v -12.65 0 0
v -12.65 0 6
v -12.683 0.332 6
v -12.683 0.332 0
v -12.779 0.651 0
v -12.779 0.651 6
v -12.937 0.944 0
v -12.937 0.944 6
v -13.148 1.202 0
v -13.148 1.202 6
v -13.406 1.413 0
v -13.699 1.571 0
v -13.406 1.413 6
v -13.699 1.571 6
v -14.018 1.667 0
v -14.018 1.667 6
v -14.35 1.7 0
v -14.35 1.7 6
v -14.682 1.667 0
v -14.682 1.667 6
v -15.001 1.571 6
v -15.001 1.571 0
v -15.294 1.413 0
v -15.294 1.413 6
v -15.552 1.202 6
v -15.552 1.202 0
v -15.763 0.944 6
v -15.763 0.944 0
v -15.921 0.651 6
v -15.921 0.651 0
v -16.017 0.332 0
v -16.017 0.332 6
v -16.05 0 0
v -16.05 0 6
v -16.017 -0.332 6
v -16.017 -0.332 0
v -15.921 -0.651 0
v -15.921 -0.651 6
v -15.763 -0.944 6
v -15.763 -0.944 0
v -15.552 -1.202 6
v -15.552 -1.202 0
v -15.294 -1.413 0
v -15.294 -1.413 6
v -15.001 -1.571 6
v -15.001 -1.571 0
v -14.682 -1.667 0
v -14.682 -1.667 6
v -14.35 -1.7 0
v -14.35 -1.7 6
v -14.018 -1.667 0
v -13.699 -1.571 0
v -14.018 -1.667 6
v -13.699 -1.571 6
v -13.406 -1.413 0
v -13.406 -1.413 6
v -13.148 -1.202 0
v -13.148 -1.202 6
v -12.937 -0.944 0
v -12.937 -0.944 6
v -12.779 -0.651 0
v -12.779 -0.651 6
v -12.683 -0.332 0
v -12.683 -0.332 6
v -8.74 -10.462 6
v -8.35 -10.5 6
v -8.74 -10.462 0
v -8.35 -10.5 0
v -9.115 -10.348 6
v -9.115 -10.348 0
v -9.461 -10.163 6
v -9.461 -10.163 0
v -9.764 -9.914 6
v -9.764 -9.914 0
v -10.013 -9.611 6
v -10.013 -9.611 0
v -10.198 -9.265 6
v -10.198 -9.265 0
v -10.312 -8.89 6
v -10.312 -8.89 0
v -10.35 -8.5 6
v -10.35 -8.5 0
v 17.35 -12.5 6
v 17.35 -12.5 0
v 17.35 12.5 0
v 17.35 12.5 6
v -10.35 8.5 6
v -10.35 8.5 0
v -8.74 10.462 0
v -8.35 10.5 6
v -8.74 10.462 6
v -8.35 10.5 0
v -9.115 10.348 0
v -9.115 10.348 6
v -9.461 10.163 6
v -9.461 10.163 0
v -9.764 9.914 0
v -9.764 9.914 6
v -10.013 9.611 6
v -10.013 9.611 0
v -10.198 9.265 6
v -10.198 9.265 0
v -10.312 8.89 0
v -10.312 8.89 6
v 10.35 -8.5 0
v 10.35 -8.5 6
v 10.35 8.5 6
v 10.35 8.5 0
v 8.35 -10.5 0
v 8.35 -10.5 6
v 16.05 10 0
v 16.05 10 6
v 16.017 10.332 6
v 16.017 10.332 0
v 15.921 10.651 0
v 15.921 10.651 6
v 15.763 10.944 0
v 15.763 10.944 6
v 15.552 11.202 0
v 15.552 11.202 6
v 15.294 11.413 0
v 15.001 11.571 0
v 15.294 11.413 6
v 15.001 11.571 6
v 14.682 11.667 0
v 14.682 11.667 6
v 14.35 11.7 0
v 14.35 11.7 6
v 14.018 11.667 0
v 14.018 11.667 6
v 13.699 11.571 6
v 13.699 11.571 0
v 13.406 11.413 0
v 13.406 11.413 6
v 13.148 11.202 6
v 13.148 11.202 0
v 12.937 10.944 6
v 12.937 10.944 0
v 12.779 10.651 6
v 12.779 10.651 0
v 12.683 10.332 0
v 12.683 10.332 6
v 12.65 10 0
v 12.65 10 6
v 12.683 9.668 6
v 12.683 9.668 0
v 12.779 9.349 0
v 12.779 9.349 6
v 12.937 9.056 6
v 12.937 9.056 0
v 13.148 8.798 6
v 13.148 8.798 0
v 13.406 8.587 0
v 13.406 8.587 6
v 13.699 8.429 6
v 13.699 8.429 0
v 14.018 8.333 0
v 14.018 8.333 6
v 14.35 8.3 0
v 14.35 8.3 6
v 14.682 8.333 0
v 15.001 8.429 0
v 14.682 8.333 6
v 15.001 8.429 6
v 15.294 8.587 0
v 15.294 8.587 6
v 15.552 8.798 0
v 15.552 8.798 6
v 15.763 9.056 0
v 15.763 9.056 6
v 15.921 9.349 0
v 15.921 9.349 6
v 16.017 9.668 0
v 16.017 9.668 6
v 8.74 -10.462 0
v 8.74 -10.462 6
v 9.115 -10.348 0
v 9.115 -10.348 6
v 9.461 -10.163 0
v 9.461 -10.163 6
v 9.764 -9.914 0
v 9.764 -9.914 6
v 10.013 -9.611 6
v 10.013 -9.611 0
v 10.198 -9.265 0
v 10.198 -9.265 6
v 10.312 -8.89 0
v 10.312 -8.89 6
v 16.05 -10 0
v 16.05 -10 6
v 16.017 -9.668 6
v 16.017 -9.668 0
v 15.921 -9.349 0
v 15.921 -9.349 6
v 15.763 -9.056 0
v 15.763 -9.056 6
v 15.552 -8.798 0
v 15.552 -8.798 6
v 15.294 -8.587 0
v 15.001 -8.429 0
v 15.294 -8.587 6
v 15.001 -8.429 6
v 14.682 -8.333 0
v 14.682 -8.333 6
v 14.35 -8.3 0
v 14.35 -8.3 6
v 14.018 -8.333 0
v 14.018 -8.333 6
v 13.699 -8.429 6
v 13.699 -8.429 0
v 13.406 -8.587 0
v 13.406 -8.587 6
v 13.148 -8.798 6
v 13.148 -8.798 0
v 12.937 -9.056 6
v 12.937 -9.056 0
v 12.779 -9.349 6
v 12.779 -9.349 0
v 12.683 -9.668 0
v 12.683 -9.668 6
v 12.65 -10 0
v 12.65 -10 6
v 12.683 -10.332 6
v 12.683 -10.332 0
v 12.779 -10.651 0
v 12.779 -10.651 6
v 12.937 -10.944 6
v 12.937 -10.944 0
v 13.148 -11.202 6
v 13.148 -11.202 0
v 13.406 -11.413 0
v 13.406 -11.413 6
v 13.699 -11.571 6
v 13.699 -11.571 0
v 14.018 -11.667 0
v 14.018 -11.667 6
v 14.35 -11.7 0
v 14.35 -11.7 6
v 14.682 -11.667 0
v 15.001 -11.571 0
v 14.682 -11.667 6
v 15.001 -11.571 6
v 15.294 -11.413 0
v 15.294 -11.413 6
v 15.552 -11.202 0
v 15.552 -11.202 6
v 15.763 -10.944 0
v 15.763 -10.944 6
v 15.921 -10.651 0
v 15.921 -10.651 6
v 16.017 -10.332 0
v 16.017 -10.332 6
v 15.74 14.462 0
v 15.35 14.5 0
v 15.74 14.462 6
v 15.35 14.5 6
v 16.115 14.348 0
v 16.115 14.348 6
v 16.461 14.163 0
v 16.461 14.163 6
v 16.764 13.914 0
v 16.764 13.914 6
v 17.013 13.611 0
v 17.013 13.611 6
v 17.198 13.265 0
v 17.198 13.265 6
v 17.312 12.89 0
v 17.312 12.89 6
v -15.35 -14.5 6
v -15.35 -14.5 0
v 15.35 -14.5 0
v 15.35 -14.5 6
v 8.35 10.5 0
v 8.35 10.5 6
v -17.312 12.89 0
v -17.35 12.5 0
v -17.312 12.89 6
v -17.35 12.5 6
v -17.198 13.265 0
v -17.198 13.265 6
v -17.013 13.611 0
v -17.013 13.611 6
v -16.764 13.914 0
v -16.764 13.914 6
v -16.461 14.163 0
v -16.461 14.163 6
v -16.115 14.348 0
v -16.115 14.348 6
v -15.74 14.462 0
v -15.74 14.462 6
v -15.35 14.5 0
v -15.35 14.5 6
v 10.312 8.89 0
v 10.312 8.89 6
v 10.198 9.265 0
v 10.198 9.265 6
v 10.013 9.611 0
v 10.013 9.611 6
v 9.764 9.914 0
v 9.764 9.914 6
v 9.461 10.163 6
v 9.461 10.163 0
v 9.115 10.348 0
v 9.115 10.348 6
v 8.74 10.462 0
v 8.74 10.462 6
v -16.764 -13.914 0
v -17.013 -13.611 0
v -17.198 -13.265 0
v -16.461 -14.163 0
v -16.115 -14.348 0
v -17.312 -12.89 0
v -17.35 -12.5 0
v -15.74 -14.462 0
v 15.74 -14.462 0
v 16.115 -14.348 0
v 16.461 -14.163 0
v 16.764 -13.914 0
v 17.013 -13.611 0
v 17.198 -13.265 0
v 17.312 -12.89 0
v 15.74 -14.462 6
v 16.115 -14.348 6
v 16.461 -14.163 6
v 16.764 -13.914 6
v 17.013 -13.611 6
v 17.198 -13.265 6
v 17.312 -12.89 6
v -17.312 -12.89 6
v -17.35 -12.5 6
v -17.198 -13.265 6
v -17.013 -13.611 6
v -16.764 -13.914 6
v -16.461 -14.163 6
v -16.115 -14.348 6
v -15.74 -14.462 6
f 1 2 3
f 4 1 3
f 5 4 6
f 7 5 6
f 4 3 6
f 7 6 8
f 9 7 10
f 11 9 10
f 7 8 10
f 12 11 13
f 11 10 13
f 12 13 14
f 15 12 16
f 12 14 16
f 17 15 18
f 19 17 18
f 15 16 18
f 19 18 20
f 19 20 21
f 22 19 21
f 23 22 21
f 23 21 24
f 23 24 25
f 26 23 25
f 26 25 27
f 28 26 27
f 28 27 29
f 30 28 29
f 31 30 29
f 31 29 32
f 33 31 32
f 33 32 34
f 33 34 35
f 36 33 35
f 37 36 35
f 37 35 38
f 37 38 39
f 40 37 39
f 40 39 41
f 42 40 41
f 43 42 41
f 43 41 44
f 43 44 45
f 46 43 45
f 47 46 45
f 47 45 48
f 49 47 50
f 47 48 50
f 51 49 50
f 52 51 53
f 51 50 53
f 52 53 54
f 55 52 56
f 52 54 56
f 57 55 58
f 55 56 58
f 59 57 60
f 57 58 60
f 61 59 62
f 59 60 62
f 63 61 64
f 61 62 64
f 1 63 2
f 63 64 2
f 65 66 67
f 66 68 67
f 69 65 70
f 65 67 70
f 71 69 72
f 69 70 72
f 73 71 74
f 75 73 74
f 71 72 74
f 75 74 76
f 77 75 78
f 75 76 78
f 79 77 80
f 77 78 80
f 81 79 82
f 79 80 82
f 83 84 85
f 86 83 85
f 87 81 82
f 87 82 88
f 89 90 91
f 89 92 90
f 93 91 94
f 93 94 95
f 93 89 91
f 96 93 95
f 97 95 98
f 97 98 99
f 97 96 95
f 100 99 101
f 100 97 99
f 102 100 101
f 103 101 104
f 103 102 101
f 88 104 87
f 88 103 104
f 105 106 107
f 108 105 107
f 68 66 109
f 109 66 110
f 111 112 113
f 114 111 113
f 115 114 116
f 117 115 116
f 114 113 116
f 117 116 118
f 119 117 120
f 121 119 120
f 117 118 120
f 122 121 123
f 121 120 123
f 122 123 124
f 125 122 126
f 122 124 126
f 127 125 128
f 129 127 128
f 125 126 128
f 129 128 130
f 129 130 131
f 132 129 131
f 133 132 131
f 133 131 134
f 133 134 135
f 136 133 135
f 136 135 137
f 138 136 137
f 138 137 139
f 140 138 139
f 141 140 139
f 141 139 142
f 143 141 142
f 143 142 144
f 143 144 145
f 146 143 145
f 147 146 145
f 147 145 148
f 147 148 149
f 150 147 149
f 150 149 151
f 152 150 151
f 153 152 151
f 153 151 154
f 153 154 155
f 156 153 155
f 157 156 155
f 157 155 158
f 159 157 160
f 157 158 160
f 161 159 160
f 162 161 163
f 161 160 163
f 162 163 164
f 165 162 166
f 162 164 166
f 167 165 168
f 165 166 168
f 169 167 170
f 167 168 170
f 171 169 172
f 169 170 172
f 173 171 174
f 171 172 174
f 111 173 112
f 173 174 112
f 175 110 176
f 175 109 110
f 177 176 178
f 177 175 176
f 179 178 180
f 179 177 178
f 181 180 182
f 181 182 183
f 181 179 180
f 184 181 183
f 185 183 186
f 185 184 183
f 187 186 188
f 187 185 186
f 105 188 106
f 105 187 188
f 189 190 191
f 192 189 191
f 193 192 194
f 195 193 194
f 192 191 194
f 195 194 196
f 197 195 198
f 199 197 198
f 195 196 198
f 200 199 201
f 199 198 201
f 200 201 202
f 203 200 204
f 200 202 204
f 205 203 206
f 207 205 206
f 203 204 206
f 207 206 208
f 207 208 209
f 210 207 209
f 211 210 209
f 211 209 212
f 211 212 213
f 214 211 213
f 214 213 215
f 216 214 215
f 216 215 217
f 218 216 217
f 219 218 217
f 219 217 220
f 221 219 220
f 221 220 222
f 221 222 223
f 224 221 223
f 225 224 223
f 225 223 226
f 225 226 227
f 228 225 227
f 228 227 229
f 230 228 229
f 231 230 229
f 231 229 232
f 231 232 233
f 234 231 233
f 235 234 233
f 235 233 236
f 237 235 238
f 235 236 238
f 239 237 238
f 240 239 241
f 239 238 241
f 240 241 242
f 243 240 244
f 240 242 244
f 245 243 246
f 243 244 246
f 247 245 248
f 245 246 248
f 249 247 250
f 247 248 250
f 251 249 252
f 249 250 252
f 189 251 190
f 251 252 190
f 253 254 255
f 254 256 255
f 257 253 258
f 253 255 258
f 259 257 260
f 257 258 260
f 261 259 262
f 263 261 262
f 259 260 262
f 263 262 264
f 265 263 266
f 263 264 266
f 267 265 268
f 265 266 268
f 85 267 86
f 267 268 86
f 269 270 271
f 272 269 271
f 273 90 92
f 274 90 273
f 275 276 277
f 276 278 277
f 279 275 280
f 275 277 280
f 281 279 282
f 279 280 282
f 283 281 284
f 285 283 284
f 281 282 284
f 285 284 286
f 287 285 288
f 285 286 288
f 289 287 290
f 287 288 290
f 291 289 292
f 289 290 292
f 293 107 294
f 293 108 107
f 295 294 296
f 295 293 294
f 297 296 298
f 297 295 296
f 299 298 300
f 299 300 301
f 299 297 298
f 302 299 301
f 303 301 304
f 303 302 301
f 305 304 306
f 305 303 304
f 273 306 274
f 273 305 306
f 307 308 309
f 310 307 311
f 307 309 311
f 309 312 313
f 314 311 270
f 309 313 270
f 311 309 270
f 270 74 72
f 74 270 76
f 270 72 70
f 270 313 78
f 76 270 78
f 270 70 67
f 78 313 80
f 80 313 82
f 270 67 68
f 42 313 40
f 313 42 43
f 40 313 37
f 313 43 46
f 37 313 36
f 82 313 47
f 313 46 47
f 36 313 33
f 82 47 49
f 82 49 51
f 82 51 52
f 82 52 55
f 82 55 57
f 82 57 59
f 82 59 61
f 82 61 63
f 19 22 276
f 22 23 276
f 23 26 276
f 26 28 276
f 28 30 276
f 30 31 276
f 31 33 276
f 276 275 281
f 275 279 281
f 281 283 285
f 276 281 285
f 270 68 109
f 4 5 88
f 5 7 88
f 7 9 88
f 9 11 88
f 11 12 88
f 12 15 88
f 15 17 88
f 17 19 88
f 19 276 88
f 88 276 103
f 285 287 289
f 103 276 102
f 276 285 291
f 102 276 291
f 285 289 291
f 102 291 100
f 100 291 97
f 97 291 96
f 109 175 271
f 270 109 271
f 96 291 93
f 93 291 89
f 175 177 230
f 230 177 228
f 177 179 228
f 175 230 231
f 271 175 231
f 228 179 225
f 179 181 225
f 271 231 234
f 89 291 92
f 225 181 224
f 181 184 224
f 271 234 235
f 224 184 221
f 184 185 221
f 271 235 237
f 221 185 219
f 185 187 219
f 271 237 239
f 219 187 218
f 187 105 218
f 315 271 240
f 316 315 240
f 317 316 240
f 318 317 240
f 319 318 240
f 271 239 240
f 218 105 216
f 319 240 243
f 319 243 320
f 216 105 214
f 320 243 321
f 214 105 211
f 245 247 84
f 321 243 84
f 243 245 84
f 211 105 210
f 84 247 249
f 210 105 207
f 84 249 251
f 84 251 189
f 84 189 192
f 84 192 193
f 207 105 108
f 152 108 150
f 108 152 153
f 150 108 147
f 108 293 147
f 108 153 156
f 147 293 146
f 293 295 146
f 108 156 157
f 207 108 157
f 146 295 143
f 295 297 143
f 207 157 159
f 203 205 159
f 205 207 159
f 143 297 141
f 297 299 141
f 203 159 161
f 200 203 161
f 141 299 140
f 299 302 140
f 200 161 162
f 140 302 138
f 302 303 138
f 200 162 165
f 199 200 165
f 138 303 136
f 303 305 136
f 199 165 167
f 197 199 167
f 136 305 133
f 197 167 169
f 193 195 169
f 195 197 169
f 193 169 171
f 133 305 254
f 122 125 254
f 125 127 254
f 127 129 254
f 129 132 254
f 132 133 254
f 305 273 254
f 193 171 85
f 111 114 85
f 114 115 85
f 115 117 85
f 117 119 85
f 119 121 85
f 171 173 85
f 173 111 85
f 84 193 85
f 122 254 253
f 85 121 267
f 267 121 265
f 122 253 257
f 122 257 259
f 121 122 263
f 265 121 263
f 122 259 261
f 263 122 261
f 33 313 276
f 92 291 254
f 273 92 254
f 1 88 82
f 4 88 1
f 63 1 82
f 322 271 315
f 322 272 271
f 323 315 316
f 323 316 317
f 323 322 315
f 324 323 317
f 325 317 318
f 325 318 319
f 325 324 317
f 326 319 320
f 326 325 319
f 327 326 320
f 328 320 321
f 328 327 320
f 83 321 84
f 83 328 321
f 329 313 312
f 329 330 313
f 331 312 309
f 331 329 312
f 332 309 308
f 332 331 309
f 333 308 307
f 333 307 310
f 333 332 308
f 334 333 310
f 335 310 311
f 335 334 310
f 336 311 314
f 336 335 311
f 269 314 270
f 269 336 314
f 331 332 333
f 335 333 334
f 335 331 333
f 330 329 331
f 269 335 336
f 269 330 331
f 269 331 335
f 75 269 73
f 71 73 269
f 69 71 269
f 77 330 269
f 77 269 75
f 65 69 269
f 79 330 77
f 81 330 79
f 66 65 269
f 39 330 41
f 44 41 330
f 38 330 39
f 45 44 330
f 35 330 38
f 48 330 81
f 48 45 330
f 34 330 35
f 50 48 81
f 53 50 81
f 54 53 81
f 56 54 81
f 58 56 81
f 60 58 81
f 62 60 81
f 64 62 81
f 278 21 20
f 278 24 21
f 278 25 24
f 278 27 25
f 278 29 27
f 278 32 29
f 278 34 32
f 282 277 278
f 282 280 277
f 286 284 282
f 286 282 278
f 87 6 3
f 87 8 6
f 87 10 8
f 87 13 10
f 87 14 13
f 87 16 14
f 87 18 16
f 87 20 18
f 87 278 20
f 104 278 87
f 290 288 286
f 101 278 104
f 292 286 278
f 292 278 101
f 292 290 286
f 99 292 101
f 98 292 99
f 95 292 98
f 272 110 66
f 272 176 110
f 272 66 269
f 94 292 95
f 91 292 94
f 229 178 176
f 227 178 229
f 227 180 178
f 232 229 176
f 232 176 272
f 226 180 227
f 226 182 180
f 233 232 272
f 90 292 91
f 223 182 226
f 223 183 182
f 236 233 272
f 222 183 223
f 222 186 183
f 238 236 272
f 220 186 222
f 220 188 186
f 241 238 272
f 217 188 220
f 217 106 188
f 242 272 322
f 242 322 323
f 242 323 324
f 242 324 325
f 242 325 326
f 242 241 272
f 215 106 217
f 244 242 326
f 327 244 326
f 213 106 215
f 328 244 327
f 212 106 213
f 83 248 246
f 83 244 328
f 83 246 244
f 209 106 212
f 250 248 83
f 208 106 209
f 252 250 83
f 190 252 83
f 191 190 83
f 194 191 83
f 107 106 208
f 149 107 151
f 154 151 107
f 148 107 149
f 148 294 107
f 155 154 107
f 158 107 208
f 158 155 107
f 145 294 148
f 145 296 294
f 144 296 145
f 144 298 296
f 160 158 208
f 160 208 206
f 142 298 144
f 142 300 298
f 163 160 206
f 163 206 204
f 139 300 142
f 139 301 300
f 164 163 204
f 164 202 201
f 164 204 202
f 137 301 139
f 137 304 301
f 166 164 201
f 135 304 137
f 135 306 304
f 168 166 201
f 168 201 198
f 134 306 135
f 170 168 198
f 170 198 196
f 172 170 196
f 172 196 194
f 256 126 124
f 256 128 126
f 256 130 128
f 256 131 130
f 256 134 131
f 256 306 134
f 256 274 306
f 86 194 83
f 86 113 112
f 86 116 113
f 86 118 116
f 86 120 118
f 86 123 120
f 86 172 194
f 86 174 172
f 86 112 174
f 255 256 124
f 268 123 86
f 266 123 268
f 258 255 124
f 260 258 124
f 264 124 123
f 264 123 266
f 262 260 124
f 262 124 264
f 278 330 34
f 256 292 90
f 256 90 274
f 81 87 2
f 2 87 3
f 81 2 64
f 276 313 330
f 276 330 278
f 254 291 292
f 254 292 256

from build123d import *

# Parameters (mm, degrees)
SKETCH_1_W          = 34.7
SKETCH_1_H          = 29
EXTRUDE_1_DEPTH     = 6
SKETCH_2_R          = 1.7
CUT_EXTRUDE_1_DEPTH = 25
SKETCH_3_W          = 20.7
SKETCH_3_H          = 21
CUT_EXTRUDE_2_DEPTH = 10
FILLET_1_R          = 2
FILLET_2_R          = 2


with BuildPart() as part:
    # 草图1 → 凸台-拉伸1 (new body)
    with BuildSketch(Plane.XY):
        Rectangle(SKETCH_1_W, SKETCH_1_H)
    extrude(amount=EXTRUDE_1_DEPTH)

    # 草图2 → 切除-拉伸1 (cut)
    with BuildSketch(Plane.XY.offset(6)):
        with Locations((14.35, -10)):
            Circle(SKETCH_2_R)
        with Locations((-14.35, 0)):
            Circle(SKETCH_2_R)
        with Locations((14.35, 10)):
            Circle(SKETCH_2_R)
    extrude(amount=-CUT_EXTRUDE_1_DEPTH, mode=Mode.SUBTRACT)

    # 草图3 → 切除-拉伸2 (cut)
    with BuildSketch(Plane.XY.offset(6)):
        Rectangle(SKETCH_3_W, SKETCH_3_H)
    extrude(amount=-CUT_EXTRUDE_2_DEPTH, mode=Mode.SUBTRACT)

    # 圆角1
    fillet_1_edges = [part.edges().sort_by_distance(p)[0] for p in [
        (10.35, 10.5, 3),
        (10.35, -10.5, 3),
        (-10.35, -10.5, 3),
        (-10.35, 10.5, 3),
    ]]
    fillet(fillet_1_edges, radius=FILLET_1_R)

    # 圆角2
    fillet_2_edges = [part.edges().sort_by_distance(p)[0] for p in [
        (17.35, -14.5, 3),
        (-17.35, -14.5, 3),
        (-17.35, 14.5, 3),
        (17.35, 14.5, 3),
    ]]
    fillet(fillet_2_edges, radius=FILLET_2_R)


solid = part.part
